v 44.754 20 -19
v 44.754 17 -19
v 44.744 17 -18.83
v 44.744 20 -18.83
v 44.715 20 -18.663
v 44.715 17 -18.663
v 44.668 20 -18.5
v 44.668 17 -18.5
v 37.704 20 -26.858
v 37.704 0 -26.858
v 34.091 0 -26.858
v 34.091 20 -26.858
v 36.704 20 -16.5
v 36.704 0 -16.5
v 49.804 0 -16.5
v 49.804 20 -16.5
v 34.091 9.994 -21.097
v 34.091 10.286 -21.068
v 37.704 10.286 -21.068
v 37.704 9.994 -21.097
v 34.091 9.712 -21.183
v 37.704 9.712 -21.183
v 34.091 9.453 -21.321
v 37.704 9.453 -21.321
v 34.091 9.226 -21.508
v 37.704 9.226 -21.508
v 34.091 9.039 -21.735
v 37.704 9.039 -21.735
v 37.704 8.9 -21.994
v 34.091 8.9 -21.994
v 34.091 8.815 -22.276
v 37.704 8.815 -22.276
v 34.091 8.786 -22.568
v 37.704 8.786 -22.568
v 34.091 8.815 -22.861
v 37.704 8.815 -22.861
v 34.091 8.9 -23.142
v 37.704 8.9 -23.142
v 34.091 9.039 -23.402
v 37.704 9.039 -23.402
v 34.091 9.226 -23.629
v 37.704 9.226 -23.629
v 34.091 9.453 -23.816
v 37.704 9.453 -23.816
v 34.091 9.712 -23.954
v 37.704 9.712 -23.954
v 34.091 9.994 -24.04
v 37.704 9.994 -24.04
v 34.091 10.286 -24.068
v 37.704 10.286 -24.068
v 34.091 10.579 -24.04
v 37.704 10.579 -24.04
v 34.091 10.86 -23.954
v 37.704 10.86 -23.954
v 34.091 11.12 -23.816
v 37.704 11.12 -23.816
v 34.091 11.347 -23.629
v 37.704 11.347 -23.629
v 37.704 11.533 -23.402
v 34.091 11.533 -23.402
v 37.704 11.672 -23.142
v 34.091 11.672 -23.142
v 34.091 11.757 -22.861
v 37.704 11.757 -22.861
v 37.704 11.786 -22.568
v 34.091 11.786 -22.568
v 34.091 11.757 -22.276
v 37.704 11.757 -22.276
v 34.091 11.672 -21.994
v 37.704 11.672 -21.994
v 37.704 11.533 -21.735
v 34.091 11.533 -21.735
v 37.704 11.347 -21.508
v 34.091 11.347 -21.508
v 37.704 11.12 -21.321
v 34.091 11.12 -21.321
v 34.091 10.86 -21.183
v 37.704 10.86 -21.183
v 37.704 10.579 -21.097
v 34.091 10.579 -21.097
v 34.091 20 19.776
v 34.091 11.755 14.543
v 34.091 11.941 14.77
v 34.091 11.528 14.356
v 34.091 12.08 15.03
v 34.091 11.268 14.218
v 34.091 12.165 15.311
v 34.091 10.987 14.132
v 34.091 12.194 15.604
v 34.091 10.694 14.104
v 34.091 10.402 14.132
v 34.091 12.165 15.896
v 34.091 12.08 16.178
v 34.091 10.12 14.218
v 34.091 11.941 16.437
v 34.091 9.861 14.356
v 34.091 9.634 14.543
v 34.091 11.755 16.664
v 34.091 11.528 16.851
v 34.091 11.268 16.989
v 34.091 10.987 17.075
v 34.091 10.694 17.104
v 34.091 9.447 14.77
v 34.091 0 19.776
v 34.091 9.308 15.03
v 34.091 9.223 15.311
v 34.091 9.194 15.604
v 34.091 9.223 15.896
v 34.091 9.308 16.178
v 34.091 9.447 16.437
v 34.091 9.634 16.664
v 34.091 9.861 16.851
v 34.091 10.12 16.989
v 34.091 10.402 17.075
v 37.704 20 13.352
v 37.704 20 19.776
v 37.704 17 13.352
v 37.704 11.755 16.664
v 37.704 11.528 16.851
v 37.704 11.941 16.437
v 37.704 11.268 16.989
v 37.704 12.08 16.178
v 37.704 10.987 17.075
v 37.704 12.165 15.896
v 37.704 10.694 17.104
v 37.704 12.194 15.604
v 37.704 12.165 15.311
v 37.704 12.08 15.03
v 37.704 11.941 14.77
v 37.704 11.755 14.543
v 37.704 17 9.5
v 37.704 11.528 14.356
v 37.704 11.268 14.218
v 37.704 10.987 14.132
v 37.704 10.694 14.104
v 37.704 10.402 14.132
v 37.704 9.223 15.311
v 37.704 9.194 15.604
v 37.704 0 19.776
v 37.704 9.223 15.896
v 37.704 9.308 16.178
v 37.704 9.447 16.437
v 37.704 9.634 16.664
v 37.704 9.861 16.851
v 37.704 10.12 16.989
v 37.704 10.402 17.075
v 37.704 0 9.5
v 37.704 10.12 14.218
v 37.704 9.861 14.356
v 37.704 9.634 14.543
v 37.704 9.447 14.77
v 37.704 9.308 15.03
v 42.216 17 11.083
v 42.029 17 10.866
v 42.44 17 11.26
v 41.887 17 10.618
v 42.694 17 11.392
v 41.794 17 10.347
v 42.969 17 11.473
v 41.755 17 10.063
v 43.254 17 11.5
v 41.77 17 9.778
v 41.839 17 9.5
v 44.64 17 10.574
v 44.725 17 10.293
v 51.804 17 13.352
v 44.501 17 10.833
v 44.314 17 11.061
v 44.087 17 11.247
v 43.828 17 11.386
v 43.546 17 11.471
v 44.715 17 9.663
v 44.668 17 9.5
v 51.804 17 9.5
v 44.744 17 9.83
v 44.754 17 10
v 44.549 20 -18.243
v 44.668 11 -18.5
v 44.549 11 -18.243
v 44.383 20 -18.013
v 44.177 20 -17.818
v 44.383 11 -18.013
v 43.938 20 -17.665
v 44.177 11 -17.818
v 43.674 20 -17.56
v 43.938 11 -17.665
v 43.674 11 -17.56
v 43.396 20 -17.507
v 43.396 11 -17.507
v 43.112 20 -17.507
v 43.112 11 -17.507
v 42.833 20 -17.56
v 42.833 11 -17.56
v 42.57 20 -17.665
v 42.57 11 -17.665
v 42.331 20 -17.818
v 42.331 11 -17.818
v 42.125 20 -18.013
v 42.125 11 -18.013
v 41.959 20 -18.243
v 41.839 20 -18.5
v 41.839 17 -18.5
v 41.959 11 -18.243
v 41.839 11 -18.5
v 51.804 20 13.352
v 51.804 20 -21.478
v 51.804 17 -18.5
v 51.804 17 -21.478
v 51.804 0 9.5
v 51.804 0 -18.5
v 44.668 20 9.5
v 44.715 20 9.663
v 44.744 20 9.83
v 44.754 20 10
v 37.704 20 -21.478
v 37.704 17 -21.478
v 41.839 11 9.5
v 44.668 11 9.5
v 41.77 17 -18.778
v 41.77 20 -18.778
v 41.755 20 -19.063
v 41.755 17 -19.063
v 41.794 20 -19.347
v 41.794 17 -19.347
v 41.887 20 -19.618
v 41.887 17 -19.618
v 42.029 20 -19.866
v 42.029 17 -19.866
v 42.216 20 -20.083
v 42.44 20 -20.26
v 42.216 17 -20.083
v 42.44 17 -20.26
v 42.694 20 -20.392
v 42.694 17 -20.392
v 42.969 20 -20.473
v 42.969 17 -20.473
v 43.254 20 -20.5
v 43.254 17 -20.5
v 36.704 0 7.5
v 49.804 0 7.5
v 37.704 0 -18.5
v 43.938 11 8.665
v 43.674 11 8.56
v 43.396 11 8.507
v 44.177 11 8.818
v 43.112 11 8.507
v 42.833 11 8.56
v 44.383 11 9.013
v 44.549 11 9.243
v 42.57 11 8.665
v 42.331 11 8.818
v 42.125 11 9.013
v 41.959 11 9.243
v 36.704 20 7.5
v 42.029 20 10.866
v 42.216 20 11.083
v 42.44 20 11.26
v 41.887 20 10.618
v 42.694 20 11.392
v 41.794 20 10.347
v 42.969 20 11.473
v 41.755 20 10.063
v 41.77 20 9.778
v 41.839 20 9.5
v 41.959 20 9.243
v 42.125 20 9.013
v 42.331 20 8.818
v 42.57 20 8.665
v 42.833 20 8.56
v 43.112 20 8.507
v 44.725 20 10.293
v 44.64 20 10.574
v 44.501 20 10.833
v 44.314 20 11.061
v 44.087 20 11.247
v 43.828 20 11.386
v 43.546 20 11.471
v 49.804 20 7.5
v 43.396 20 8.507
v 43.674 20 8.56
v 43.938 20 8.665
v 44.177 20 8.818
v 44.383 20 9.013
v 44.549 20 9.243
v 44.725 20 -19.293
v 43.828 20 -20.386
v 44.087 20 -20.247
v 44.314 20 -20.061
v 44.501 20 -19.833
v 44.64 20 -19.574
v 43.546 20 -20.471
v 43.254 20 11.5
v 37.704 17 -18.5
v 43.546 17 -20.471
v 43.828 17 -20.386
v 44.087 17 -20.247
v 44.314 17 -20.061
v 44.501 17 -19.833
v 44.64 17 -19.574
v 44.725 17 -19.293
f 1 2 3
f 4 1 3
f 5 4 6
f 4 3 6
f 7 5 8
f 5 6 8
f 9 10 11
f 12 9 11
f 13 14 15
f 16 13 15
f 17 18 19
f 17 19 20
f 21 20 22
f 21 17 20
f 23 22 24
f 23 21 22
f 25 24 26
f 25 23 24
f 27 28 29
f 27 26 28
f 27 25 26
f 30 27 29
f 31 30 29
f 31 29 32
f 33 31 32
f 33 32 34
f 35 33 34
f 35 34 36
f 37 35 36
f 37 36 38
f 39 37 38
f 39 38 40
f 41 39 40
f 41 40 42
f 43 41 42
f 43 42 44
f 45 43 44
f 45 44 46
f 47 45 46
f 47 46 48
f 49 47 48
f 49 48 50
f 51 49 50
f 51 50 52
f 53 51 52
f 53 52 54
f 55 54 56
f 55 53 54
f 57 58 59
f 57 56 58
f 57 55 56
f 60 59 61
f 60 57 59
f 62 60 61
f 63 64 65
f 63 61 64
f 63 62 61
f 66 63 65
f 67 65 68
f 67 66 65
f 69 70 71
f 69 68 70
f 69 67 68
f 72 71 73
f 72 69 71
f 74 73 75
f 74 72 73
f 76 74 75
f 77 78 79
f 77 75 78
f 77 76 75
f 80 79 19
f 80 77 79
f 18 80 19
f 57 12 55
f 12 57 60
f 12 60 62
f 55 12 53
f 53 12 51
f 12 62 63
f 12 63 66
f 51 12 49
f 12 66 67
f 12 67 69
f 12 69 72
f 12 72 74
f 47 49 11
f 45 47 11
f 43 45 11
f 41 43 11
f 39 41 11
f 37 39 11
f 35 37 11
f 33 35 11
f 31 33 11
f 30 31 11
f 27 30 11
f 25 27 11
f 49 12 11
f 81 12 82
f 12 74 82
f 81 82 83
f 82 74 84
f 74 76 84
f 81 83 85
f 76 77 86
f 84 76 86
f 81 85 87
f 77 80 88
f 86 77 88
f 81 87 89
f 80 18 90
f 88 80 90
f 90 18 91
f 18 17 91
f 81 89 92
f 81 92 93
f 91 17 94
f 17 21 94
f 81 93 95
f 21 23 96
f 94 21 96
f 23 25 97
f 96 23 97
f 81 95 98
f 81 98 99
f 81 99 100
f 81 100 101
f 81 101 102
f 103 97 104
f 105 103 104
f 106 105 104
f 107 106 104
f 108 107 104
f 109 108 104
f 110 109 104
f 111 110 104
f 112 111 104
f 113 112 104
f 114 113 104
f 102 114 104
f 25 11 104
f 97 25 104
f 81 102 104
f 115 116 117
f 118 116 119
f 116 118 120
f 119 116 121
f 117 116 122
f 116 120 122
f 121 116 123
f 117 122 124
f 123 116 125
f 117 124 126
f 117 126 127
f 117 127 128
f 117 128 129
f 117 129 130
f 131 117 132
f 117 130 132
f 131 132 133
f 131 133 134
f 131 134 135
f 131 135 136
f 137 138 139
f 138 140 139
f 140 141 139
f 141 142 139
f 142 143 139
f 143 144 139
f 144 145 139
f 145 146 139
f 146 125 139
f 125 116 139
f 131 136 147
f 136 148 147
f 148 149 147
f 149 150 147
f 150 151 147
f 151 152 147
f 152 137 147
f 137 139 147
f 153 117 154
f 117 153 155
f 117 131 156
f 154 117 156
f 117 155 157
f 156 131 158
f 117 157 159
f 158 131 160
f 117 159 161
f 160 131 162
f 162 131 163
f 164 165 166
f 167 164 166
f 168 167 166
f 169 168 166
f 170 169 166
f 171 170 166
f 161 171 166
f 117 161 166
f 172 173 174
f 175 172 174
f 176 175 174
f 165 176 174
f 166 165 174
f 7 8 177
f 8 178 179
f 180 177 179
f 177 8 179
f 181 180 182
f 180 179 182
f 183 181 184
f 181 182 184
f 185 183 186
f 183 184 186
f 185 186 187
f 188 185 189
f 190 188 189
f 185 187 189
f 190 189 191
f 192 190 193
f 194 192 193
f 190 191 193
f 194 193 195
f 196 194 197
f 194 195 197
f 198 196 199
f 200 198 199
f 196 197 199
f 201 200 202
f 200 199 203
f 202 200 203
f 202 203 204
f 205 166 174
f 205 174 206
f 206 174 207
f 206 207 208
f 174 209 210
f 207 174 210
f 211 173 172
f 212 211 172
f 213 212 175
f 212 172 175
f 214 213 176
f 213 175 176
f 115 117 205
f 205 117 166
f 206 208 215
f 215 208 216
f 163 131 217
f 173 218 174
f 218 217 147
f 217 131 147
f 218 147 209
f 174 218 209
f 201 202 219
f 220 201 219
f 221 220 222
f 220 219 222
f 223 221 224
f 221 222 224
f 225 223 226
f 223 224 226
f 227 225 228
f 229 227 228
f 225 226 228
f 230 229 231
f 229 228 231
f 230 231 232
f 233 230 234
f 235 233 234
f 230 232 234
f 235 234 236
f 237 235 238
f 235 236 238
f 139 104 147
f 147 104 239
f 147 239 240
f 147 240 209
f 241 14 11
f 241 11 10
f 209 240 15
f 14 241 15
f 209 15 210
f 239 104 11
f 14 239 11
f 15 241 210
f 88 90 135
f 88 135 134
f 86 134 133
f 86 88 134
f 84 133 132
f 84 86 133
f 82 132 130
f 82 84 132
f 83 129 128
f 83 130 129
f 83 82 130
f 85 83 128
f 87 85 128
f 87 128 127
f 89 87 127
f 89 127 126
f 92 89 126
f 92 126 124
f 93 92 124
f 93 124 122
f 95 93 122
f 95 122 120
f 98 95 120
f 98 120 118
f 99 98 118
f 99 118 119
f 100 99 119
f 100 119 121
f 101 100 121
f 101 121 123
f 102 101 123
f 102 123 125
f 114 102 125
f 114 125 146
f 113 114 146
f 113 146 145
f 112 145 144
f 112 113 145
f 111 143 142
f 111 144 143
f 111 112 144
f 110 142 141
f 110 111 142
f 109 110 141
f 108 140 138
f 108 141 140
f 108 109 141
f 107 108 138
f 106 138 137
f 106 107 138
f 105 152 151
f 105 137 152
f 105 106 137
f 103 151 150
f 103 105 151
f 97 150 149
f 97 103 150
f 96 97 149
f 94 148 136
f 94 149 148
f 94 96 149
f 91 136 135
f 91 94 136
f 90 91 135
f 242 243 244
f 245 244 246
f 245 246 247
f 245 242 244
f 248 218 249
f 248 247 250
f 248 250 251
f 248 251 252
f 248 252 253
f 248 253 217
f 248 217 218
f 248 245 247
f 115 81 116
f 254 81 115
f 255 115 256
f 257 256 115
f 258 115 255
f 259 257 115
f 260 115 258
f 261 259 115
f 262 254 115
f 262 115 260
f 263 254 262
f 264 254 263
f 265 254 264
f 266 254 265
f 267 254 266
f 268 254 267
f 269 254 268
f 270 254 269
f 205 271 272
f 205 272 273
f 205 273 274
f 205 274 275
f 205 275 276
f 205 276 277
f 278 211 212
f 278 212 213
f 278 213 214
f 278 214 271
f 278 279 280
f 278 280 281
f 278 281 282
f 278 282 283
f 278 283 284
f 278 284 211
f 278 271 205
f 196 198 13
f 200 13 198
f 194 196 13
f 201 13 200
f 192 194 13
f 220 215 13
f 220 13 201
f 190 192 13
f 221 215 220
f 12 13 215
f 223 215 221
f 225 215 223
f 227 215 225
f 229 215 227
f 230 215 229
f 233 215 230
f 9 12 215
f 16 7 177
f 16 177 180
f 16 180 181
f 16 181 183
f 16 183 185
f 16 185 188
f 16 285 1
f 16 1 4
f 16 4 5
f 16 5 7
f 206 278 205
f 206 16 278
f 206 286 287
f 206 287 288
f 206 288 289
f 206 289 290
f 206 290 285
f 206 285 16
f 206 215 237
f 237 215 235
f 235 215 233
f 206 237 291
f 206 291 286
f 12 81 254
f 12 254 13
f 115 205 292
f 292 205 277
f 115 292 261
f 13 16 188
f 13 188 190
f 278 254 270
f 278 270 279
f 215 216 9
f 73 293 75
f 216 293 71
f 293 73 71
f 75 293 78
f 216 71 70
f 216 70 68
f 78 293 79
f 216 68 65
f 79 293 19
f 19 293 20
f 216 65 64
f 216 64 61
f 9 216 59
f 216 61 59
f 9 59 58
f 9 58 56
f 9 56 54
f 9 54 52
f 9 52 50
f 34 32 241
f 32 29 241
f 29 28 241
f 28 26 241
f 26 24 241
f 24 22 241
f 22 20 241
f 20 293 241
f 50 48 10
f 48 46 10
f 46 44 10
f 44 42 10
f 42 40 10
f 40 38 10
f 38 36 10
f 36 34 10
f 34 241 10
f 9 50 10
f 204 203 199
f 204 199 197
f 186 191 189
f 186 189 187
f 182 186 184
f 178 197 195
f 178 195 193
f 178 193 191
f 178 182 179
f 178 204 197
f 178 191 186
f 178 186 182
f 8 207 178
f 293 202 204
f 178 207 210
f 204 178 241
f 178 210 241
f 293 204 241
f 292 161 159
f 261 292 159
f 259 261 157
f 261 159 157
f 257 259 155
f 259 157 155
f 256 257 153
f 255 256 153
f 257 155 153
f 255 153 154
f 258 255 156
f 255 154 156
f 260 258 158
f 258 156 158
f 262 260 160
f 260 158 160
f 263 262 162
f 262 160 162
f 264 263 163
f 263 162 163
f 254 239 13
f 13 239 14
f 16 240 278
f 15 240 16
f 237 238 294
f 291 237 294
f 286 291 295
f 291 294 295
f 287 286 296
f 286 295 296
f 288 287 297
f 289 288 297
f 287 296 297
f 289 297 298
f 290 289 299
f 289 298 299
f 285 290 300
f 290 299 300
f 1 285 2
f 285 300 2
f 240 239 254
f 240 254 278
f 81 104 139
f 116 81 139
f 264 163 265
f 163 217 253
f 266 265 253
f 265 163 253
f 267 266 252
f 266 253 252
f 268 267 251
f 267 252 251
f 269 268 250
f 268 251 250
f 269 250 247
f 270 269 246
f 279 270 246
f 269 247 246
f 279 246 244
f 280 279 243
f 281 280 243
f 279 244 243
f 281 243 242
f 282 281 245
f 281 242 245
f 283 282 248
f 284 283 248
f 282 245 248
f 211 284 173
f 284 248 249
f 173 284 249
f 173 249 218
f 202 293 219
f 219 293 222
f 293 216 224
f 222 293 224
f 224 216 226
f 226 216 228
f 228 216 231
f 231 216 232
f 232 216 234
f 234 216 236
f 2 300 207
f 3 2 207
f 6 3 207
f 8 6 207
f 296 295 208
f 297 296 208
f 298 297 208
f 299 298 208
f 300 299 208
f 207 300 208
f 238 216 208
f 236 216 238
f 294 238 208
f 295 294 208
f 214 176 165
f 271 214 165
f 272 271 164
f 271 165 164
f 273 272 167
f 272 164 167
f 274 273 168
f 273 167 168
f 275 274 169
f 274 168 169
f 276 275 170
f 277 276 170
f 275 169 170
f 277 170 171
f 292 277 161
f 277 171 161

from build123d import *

# Parameters (mm, degrees)
SKETCH1_W               = 13.1
SKETCH1_H               = 24
BOSS_EXTRUDE1_DEPTH     = 20
CUT_EXTRUDE1_DEPTH      = 37.333765723
CUT_EXTRUDE1_DEPTH_BACK = 37.333765723
SKETCH4_R               = 1.5
BOSS_EXTRUDE2_START     = 17
BOSS_EXTRUDE2_DEPTH     = 3
BOSS_EXTRUDE3_DEPTH     = 11


with BuildPart() as part:
    # Sketch1 → Boss-Extrude1 (new body)
    with BuildSketch(Plane(origin=(0, 0, 0), x_dir=(1, 0, 0), z_dir=(0, 1, 0))):
        with BuildLine():
            Line((51.803705275, -9.5), (51.803705275, 18.5))
            Line((51.803705275, 18.5), (44.667918837, 18.5))
            ThreePointArc((44.667918837, 18.5), (43.253705275, 17.5), (41.839491713, 18.5))
            Line((41.839491713, 18.5), (37.703705275, 18.5))
            Line((37.703705275, 18.5), (37.703705275, 26.857634512))
            Line((37.703705275, 26.857634512), (34.090699836, 26.857634512))
            Line((34.090699836, 26.857634512), (34.090699836, -19.776172663))
            Line((34.090699836, -19.776172663), (37.703705275, -19.776172663))
            Line((37.703705275, -19.776172663), (37.703705275, -9.5))
            Line((37.703705275, -9.5), (41.839491713, -9.5))
            ThreePointArc((41.839491713, -9.5), (43.253705275, -8.5), (44.667918837, -9.5))
            Line((44.667918837, -9.5), (51.803705275, -9.5))
        make_face()
        with Locations((43.253705275, 4.5)):
            Rectangle(SKETCH1_W, SKETCH1_H, mode=Mode.SUBTRACT)
    extrude(amount=BOSS_EXTRUDE1_DEPTH)

    # Sketch4 → Cut-Extrude1 (cut, two sides: drawn at the far end of the back side and taken through both)
    with BuildSketch(Plane(origin=(37.703705275, 0, 0), x_dir=(0, 0, -1), z_dir=(1, 0, 0)).offset(-CUT_EXTRUDE1_DEPTH_BACK)):
        with Locations((-15.603546026, 10.694249846)):
            Circle(SKETCH4_R)
        with Locations(Location((22.568421885, 10.286160732, 0), (0, 0, 180))):
            Circle(SKETCH4_R)
    extrude(amount=CUT_EXTRUDE1_DEPTH + CUT_EXTRUDE1_DEPTH_BACK, mode=Mode.SUBTRACT)

    # Sketch1<31> → Boss-Extrude2 (add)
    with BuildSketch(Plane(origin=(0, 0, 0), x_dir=(1, 0, 0), z_dir=(0, 1, 0)).offset(BOSS_EXTRUDE2_START)):
        with BuildLine():
            Line((51.803705275, -13.351943518), (51.803705275, -9.5))
            Line((51.803705275, -9.5), (44.667918837, -9.5))
            ThreePointArc((44.667918837, -9.5), (44.732103114, -9.746347032), (44.753705275, -10))
            ThreePointArc((44.753705275, -10), (44.314365447, -11.060660172), (43.253705275, -11.5))
            Line((43.253705275, -11.5), (43.253705275, -13.351943518))
            Line((43.253705275, -13.351943518), (51.803705275, -13.351943518))
        make_face()
        with BuildLine():
            Line((37.703705275, -13.351943518), (43.253705275, -13.351943518))
            Line((43.253705275, -13.351943518), (43.253705275, -11.5))
            ThreePointArc((43.253705275, -11.5), (42.028960404, -10.866025404), (41.839491713, -9.5))
            Line((41.839491713, -9.5), (37.703705275, -9.5))
            Line((37.703705275, -9.5), (37.703705275, -13.351943518))
        make_face()
        with BuildLine():
            Line((44.667918837, 18.5), (51.803705275, 18.5))
            Line((51.803705275, 18.5), (51.803705275, 21.478401139))
            Line((51.803705275, 21.478401139), (43.253705275, 21.478401139))
            Line((43.253705275, 21.478401139), (43.253705275, 20.5))
            ThreePointArc((43.253705275, 20.5), (44.314365447, 20.060660172), (44.753705275, 19))
            ThreePointArc((44.753705275, 19), (44.732103114, 18.746347032), (44.667918837, 18.5))
        make_face()
        with BuildLine():
            Line((43.253705275, 20.5), (43.253705275, 21.478401139))
            Line((43.253705275, 21.478401139), (37.703705275, 21.478401139))
            Line((37.703705275, 21.478401139), (37.703705275, 18.5))
            Line((37.703705275, 18.5), (41.839491713, 18.5))
            ThreePointArc((41.839491713, 18.5), (42.028960404, 19.866025404), (43.253705275, 20.5))
        make_face()
    extrude(amount=BOSS_EXTRUDE2_DEPTH)

    # Sketch1<32> → Boss-Extrude3 (add)
    with BuildSketch(Plane(origin=(0, 0, 0), x_dir=(1, 0, 0), z_dir=(0, 1, 0))):
        with BuildLine():
            Line((44.667918837, 18.5), (41.839491713, 18.5))
            ThreePointArc((41.839491713, 18.5), (43.253705275, 17.5), (44.667918837, 18.5))
        make_face()
        with BuildLine():
            ThreePointArc((44.667918837, -9.5), (43.253705275, -8.5), (41.839491713, -9.5))
            Line((41.839491713, -9.5), (44.667918837, -9.5))
        make_face()
    extrude(amount=BOSS_EXTRUDE3_DEPTH)


solid = part.part
